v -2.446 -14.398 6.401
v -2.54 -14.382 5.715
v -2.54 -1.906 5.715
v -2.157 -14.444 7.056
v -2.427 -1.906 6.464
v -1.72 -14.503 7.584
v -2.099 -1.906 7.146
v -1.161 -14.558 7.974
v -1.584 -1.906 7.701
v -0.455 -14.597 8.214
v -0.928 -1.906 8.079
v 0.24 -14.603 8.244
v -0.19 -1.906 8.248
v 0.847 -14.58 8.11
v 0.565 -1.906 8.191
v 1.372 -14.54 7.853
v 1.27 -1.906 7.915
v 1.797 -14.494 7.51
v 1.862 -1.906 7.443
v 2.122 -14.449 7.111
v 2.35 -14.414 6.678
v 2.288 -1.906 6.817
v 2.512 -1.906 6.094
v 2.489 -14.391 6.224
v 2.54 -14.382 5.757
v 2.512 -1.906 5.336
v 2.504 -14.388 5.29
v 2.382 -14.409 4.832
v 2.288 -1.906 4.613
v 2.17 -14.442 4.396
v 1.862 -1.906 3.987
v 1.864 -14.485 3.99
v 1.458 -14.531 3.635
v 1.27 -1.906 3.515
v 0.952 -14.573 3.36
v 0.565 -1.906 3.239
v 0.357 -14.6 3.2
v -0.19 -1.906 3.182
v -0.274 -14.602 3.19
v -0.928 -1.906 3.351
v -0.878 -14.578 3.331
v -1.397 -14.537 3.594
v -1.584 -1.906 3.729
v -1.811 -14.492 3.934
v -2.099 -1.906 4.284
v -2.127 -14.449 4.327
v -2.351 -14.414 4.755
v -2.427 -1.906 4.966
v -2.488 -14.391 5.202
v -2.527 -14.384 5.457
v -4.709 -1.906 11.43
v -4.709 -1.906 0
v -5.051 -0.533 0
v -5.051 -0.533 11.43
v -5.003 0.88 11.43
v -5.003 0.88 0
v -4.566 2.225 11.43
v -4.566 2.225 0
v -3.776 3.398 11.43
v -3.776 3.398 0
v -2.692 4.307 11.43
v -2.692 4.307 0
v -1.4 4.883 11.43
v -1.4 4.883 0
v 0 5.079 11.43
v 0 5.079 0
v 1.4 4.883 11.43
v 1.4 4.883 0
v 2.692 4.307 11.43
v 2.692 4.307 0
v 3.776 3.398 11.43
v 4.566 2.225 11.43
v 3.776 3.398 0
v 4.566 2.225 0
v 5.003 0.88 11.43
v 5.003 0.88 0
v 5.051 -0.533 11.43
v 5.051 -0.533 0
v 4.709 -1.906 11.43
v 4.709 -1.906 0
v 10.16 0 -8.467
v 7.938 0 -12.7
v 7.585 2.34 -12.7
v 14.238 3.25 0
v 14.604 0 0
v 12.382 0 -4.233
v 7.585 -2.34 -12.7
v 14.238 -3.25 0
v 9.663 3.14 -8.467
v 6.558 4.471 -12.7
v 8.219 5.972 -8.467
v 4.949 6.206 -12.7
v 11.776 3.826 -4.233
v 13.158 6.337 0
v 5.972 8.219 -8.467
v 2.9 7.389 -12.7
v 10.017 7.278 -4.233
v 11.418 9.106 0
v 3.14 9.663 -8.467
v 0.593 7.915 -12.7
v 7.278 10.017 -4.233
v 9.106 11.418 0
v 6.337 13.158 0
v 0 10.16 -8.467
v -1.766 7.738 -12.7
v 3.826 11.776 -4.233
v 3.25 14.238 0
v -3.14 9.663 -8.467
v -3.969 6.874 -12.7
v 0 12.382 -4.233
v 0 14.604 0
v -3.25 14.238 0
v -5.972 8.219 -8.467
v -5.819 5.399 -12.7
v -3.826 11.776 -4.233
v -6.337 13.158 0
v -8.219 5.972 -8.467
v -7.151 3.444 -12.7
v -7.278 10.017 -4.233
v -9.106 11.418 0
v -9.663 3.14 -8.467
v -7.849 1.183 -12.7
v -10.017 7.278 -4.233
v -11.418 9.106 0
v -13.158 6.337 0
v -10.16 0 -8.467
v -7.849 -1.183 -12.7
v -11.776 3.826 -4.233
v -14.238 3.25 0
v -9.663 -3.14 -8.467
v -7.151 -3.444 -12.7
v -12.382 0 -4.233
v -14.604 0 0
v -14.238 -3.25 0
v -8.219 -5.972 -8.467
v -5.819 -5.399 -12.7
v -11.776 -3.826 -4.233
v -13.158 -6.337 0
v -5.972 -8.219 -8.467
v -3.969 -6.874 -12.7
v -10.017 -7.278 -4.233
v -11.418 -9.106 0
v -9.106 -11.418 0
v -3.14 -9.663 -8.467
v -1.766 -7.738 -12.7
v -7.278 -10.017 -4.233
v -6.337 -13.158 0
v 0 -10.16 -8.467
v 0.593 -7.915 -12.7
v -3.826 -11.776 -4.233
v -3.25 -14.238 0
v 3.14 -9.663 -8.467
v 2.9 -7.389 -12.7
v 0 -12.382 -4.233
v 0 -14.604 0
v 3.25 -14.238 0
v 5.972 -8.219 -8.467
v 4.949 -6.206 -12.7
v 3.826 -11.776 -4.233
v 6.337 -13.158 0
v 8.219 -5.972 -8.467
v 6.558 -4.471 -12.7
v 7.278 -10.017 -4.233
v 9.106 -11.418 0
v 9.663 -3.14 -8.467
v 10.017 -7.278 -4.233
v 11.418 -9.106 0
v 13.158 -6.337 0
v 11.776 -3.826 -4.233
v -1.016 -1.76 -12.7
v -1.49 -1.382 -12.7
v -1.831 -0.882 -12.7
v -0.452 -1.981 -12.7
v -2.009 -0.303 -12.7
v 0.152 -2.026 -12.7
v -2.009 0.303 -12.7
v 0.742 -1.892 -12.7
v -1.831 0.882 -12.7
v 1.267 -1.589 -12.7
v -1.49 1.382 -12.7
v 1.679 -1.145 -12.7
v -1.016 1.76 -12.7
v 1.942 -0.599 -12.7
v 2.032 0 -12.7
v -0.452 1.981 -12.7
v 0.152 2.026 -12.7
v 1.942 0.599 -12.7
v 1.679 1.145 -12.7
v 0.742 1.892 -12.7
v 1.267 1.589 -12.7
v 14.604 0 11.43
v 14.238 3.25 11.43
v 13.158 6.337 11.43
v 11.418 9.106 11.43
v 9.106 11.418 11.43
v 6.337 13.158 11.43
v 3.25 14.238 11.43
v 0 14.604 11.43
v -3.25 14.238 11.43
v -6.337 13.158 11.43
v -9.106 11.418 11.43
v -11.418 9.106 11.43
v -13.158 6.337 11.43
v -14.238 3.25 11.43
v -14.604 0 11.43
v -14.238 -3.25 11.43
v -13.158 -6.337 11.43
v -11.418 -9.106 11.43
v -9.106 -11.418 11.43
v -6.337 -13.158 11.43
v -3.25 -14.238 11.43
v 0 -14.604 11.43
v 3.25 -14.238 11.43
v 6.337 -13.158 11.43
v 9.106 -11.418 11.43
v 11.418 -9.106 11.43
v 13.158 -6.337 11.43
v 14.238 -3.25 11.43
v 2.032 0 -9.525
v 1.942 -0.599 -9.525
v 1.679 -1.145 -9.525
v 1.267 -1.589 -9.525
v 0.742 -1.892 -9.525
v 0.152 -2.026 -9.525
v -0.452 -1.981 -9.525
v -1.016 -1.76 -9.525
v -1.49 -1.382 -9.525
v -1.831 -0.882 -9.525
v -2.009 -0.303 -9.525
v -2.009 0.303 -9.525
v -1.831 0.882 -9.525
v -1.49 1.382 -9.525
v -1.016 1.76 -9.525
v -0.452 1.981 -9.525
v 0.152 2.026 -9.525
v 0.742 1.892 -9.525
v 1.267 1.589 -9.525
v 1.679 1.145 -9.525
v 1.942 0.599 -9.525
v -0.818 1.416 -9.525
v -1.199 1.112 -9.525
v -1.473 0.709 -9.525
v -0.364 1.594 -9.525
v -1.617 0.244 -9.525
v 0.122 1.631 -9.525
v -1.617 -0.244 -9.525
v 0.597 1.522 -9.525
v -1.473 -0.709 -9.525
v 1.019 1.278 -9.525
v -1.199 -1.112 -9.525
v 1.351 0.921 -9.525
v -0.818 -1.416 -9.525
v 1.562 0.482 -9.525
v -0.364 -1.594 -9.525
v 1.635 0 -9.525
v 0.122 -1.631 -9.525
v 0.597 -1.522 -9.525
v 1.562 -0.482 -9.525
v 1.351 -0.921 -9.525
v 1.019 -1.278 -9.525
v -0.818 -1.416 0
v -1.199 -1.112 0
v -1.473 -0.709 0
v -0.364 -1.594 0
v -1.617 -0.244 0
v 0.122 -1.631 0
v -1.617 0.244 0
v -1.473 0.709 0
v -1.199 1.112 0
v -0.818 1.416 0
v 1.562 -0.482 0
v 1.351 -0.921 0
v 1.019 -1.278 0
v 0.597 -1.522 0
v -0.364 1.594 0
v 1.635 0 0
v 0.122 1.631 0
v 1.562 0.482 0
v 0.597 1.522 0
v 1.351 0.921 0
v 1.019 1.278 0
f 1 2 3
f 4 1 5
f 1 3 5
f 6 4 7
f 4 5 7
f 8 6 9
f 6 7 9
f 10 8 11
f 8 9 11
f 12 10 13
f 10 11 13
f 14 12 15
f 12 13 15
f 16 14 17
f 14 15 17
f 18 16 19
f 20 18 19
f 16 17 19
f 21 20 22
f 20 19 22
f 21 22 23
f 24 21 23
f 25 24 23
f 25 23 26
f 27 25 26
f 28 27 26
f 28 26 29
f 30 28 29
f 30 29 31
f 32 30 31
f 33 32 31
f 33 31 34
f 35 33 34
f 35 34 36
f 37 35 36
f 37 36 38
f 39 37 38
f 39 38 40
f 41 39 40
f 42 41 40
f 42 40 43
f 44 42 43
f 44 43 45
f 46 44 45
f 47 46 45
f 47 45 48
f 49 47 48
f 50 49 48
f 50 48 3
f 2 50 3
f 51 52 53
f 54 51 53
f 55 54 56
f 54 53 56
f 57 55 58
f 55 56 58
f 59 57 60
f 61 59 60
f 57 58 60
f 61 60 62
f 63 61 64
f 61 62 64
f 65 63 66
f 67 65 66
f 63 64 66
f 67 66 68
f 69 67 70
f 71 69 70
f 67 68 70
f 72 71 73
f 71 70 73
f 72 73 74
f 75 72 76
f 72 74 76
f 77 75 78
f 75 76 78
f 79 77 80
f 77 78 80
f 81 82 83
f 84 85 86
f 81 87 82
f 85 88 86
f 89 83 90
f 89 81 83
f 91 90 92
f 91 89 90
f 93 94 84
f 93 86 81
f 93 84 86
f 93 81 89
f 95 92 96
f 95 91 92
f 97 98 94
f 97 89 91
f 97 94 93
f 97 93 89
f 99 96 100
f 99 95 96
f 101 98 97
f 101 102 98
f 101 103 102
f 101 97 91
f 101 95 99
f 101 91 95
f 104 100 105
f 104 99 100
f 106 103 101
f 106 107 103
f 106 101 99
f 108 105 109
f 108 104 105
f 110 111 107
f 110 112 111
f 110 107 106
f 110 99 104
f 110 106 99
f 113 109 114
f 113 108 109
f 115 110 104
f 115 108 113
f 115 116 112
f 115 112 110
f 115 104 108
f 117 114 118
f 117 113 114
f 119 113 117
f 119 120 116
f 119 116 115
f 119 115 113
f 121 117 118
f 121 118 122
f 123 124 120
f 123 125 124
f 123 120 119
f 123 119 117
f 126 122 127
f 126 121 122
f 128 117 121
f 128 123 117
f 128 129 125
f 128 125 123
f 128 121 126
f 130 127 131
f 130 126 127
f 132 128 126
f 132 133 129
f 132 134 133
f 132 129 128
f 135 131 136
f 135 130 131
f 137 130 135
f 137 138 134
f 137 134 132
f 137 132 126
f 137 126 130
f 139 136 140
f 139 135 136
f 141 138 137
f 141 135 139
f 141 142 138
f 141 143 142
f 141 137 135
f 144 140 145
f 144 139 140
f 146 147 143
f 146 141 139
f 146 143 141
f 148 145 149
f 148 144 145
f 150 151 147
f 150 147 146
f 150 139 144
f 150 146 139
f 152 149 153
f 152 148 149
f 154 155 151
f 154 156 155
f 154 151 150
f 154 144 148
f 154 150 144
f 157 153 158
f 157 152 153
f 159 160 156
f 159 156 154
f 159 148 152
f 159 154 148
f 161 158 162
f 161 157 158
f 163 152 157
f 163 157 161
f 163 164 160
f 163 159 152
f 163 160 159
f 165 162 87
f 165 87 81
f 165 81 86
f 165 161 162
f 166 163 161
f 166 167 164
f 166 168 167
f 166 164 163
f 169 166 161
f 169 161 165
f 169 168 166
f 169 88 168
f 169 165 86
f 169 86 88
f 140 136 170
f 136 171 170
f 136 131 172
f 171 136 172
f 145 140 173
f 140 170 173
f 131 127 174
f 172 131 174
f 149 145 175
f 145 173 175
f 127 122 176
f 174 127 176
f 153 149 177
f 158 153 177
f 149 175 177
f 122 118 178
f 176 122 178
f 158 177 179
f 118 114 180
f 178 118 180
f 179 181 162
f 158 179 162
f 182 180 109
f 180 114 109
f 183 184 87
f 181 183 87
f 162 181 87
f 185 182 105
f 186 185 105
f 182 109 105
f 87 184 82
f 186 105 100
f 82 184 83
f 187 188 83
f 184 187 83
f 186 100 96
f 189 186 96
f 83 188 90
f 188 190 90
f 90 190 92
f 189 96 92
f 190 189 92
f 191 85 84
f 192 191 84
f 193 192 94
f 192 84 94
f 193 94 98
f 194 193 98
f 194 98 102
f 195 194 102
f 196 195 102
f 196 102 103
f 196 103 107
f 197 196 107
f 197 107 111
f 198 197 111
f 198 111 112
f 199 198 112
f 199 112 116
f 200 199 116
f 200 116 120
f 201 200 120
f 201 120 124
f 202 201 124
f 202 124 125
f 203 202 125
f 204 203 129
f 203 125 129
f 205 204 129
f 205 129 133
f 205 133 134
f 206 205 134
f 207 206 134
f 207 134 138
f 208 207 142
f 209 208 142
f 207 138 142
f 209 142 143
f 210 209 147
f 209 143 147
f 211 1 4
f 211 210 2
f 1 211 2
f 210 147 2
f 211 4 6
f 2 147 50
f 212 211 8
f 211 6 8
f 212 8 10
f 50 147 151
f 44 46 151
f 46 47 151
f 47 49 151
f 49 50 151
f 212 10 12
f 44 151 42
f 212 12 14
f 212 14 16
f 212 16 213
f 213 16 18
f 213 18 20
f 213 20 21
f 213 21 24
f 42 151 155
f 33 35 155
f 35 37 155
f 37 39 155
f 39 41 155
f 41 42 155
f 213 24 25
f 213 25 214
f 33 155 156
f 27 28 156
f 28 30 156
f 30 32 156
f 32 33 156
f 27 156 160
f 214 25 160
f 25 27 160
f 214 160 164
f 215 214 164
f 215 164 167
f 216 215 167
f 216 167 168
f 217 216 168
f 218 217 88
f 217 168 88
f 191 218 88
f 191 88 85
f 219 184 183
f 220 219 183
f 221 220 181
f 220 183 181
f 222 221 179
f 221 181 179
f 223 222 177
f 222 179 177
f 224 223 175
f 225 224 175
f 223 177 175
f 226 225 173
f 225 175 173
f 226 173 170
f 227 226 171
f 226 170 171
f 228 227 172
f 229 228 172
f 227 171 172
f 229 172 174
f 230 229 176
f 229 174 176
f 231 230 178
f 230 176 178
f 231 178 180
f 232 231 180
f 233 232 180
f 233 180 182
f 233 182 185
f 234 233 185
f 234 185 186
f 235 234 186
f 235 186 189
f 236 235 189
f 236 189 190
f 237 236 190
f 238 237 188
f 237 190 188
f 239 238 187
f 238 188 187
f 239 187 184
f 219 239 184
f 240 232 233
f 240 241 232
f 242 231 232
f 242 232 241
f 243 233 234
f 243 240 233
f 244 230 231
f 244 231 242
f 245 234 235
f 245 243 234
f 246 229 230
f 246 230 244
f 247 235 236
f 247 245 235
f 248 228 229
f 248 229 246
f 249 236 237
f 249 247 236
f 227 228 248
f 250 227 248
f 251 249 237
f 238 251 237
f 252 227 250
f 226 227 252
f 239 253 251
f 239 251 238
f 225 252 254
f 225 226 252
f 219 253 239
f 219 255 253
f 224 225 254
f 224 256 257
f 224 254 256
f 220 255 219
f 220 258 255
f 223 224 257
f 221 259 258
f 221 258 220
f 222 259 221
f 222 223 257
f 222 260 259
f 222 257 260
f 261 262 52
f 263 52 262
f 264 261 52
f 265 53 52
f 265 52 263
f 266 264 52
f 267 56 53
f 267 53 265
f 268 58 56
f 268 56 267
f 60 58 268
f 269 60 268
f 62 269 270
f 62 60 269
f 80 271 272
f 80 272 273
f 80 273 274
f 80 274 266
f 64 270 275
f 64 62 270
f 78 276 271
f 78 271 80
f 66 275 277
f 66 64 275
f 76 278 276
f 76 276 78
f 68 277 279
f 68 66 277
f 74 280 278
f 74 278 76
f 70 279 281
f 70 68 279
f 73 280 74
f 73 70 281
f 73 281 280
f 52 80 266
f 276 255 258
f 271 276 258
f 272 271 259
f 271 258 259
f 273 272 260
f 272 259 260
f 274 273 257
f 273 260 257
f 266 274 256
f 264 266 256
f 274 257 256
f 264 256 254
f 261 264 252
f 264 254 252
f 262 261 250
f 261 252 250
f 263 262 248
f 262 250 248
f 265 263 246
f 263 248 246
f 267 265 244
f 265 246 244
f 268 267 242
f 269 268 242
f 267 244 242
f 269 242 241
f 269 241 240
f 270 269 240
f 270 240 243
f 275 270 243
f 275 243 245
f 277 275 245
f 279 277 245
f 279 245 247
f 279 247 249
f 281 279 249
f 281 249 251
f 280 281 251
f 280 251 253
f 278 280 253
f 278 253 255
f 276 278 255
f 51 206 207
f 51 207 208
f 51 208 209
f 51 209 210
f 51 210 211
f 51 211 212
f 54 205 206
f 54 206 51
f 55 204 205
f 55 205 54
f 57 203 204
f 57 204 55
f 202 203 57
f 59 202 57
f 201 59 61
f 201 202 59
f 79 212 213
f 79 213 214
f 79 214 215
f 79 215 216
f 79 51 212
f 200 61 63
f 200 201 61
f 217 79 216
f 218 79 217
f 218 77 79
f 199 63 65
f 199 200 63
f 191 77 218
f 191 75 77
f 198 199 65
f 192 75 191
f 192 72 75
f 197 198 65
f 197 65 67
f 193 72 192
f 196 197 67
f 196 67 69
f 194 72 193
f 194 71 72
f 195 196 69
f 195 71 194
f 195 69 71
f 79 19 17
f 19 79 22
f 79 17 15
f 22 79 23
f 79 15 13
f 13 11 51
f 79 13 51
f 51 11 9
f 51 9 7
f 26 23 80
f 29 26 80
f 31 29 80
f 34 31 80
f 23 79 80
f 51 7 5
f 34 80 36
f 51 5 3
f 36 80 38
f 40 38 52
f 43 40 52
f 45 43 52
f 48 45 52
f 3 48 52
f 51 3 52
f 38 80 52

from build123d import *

# Parameters (mm, degrees)
F0_R      = 14.604492
F1_DEPTH  = 11.43
F2_R      = 2.54
F3_DEPTH  = 13.6989841001
F5_R      = 7.9375
F6_R      = 14.604492
F8_R      = 1.635125
F9_DEPTH  = 25.4
F8_R_2    = 2.032
F10_DEPTH = 3.175


with BuildPart() as f1:
    # F0 (on Top) → F1 (new body)
    with BuildSketch(Plane.XY):
        Circle(F0_R)
        with BuildLine():
            ThreePointArc((-4.7085324933, -1.905508), (0, 5.079492), (4.7085324933, -1.905508))
            Line((4.7085324933, -1.905508), (-4.7085324933, -1.905508))
        make_face(mode=Mode.SUBTRACT)
    extrude(amount=F1_DEPTH)

    # F2 (on face) → F3 (cut, up to face)
    with BuildSketch(Plane(origin=(0, -1.905508, 0), x_dir=(-1, 0, 0), z_dir=(0, 1, 0))):
        with Locations((0, 5.715)):
            Circle(F2_R)
    extrude(amount=-F3_DEPTH, mode=Mode.SUBTRACT)

    # F5 (on offset) → F7 section 0
    with BuildSketch(Plane.XY.offset(-12.7)):
        Circle(F5_R)
    # F6 (on Top) → F7 section 1
    with BuildSketch(Plane.XY):
        Circle(F6_R)
    loft()

    # F8 (on face) → F9 (cut)
    with BuildSketch(Plane(origin=(0, 0, -12.7), x_dir=(1, 0, 0), z_dir=(0, 0, -1))):
        Circle(F8_R)
    extrude(amount=-F9_DEPTH, mode=Mode.SUBTRACT)

    # F8 (on face) → F10 (cut)
    with BuildSketch(Plane(origin=(0, 0, -12.7), x_dir=(1, 0, 0), z_dir=(0, 0, -1))):
        Circle(F8_R_2)
        Circle(F8_R, mode=Mode.SUBTRACT)
    extrude(amount=-F10_DEPTH, mode=Mode.SUBTRACT)


solid = f1.part
